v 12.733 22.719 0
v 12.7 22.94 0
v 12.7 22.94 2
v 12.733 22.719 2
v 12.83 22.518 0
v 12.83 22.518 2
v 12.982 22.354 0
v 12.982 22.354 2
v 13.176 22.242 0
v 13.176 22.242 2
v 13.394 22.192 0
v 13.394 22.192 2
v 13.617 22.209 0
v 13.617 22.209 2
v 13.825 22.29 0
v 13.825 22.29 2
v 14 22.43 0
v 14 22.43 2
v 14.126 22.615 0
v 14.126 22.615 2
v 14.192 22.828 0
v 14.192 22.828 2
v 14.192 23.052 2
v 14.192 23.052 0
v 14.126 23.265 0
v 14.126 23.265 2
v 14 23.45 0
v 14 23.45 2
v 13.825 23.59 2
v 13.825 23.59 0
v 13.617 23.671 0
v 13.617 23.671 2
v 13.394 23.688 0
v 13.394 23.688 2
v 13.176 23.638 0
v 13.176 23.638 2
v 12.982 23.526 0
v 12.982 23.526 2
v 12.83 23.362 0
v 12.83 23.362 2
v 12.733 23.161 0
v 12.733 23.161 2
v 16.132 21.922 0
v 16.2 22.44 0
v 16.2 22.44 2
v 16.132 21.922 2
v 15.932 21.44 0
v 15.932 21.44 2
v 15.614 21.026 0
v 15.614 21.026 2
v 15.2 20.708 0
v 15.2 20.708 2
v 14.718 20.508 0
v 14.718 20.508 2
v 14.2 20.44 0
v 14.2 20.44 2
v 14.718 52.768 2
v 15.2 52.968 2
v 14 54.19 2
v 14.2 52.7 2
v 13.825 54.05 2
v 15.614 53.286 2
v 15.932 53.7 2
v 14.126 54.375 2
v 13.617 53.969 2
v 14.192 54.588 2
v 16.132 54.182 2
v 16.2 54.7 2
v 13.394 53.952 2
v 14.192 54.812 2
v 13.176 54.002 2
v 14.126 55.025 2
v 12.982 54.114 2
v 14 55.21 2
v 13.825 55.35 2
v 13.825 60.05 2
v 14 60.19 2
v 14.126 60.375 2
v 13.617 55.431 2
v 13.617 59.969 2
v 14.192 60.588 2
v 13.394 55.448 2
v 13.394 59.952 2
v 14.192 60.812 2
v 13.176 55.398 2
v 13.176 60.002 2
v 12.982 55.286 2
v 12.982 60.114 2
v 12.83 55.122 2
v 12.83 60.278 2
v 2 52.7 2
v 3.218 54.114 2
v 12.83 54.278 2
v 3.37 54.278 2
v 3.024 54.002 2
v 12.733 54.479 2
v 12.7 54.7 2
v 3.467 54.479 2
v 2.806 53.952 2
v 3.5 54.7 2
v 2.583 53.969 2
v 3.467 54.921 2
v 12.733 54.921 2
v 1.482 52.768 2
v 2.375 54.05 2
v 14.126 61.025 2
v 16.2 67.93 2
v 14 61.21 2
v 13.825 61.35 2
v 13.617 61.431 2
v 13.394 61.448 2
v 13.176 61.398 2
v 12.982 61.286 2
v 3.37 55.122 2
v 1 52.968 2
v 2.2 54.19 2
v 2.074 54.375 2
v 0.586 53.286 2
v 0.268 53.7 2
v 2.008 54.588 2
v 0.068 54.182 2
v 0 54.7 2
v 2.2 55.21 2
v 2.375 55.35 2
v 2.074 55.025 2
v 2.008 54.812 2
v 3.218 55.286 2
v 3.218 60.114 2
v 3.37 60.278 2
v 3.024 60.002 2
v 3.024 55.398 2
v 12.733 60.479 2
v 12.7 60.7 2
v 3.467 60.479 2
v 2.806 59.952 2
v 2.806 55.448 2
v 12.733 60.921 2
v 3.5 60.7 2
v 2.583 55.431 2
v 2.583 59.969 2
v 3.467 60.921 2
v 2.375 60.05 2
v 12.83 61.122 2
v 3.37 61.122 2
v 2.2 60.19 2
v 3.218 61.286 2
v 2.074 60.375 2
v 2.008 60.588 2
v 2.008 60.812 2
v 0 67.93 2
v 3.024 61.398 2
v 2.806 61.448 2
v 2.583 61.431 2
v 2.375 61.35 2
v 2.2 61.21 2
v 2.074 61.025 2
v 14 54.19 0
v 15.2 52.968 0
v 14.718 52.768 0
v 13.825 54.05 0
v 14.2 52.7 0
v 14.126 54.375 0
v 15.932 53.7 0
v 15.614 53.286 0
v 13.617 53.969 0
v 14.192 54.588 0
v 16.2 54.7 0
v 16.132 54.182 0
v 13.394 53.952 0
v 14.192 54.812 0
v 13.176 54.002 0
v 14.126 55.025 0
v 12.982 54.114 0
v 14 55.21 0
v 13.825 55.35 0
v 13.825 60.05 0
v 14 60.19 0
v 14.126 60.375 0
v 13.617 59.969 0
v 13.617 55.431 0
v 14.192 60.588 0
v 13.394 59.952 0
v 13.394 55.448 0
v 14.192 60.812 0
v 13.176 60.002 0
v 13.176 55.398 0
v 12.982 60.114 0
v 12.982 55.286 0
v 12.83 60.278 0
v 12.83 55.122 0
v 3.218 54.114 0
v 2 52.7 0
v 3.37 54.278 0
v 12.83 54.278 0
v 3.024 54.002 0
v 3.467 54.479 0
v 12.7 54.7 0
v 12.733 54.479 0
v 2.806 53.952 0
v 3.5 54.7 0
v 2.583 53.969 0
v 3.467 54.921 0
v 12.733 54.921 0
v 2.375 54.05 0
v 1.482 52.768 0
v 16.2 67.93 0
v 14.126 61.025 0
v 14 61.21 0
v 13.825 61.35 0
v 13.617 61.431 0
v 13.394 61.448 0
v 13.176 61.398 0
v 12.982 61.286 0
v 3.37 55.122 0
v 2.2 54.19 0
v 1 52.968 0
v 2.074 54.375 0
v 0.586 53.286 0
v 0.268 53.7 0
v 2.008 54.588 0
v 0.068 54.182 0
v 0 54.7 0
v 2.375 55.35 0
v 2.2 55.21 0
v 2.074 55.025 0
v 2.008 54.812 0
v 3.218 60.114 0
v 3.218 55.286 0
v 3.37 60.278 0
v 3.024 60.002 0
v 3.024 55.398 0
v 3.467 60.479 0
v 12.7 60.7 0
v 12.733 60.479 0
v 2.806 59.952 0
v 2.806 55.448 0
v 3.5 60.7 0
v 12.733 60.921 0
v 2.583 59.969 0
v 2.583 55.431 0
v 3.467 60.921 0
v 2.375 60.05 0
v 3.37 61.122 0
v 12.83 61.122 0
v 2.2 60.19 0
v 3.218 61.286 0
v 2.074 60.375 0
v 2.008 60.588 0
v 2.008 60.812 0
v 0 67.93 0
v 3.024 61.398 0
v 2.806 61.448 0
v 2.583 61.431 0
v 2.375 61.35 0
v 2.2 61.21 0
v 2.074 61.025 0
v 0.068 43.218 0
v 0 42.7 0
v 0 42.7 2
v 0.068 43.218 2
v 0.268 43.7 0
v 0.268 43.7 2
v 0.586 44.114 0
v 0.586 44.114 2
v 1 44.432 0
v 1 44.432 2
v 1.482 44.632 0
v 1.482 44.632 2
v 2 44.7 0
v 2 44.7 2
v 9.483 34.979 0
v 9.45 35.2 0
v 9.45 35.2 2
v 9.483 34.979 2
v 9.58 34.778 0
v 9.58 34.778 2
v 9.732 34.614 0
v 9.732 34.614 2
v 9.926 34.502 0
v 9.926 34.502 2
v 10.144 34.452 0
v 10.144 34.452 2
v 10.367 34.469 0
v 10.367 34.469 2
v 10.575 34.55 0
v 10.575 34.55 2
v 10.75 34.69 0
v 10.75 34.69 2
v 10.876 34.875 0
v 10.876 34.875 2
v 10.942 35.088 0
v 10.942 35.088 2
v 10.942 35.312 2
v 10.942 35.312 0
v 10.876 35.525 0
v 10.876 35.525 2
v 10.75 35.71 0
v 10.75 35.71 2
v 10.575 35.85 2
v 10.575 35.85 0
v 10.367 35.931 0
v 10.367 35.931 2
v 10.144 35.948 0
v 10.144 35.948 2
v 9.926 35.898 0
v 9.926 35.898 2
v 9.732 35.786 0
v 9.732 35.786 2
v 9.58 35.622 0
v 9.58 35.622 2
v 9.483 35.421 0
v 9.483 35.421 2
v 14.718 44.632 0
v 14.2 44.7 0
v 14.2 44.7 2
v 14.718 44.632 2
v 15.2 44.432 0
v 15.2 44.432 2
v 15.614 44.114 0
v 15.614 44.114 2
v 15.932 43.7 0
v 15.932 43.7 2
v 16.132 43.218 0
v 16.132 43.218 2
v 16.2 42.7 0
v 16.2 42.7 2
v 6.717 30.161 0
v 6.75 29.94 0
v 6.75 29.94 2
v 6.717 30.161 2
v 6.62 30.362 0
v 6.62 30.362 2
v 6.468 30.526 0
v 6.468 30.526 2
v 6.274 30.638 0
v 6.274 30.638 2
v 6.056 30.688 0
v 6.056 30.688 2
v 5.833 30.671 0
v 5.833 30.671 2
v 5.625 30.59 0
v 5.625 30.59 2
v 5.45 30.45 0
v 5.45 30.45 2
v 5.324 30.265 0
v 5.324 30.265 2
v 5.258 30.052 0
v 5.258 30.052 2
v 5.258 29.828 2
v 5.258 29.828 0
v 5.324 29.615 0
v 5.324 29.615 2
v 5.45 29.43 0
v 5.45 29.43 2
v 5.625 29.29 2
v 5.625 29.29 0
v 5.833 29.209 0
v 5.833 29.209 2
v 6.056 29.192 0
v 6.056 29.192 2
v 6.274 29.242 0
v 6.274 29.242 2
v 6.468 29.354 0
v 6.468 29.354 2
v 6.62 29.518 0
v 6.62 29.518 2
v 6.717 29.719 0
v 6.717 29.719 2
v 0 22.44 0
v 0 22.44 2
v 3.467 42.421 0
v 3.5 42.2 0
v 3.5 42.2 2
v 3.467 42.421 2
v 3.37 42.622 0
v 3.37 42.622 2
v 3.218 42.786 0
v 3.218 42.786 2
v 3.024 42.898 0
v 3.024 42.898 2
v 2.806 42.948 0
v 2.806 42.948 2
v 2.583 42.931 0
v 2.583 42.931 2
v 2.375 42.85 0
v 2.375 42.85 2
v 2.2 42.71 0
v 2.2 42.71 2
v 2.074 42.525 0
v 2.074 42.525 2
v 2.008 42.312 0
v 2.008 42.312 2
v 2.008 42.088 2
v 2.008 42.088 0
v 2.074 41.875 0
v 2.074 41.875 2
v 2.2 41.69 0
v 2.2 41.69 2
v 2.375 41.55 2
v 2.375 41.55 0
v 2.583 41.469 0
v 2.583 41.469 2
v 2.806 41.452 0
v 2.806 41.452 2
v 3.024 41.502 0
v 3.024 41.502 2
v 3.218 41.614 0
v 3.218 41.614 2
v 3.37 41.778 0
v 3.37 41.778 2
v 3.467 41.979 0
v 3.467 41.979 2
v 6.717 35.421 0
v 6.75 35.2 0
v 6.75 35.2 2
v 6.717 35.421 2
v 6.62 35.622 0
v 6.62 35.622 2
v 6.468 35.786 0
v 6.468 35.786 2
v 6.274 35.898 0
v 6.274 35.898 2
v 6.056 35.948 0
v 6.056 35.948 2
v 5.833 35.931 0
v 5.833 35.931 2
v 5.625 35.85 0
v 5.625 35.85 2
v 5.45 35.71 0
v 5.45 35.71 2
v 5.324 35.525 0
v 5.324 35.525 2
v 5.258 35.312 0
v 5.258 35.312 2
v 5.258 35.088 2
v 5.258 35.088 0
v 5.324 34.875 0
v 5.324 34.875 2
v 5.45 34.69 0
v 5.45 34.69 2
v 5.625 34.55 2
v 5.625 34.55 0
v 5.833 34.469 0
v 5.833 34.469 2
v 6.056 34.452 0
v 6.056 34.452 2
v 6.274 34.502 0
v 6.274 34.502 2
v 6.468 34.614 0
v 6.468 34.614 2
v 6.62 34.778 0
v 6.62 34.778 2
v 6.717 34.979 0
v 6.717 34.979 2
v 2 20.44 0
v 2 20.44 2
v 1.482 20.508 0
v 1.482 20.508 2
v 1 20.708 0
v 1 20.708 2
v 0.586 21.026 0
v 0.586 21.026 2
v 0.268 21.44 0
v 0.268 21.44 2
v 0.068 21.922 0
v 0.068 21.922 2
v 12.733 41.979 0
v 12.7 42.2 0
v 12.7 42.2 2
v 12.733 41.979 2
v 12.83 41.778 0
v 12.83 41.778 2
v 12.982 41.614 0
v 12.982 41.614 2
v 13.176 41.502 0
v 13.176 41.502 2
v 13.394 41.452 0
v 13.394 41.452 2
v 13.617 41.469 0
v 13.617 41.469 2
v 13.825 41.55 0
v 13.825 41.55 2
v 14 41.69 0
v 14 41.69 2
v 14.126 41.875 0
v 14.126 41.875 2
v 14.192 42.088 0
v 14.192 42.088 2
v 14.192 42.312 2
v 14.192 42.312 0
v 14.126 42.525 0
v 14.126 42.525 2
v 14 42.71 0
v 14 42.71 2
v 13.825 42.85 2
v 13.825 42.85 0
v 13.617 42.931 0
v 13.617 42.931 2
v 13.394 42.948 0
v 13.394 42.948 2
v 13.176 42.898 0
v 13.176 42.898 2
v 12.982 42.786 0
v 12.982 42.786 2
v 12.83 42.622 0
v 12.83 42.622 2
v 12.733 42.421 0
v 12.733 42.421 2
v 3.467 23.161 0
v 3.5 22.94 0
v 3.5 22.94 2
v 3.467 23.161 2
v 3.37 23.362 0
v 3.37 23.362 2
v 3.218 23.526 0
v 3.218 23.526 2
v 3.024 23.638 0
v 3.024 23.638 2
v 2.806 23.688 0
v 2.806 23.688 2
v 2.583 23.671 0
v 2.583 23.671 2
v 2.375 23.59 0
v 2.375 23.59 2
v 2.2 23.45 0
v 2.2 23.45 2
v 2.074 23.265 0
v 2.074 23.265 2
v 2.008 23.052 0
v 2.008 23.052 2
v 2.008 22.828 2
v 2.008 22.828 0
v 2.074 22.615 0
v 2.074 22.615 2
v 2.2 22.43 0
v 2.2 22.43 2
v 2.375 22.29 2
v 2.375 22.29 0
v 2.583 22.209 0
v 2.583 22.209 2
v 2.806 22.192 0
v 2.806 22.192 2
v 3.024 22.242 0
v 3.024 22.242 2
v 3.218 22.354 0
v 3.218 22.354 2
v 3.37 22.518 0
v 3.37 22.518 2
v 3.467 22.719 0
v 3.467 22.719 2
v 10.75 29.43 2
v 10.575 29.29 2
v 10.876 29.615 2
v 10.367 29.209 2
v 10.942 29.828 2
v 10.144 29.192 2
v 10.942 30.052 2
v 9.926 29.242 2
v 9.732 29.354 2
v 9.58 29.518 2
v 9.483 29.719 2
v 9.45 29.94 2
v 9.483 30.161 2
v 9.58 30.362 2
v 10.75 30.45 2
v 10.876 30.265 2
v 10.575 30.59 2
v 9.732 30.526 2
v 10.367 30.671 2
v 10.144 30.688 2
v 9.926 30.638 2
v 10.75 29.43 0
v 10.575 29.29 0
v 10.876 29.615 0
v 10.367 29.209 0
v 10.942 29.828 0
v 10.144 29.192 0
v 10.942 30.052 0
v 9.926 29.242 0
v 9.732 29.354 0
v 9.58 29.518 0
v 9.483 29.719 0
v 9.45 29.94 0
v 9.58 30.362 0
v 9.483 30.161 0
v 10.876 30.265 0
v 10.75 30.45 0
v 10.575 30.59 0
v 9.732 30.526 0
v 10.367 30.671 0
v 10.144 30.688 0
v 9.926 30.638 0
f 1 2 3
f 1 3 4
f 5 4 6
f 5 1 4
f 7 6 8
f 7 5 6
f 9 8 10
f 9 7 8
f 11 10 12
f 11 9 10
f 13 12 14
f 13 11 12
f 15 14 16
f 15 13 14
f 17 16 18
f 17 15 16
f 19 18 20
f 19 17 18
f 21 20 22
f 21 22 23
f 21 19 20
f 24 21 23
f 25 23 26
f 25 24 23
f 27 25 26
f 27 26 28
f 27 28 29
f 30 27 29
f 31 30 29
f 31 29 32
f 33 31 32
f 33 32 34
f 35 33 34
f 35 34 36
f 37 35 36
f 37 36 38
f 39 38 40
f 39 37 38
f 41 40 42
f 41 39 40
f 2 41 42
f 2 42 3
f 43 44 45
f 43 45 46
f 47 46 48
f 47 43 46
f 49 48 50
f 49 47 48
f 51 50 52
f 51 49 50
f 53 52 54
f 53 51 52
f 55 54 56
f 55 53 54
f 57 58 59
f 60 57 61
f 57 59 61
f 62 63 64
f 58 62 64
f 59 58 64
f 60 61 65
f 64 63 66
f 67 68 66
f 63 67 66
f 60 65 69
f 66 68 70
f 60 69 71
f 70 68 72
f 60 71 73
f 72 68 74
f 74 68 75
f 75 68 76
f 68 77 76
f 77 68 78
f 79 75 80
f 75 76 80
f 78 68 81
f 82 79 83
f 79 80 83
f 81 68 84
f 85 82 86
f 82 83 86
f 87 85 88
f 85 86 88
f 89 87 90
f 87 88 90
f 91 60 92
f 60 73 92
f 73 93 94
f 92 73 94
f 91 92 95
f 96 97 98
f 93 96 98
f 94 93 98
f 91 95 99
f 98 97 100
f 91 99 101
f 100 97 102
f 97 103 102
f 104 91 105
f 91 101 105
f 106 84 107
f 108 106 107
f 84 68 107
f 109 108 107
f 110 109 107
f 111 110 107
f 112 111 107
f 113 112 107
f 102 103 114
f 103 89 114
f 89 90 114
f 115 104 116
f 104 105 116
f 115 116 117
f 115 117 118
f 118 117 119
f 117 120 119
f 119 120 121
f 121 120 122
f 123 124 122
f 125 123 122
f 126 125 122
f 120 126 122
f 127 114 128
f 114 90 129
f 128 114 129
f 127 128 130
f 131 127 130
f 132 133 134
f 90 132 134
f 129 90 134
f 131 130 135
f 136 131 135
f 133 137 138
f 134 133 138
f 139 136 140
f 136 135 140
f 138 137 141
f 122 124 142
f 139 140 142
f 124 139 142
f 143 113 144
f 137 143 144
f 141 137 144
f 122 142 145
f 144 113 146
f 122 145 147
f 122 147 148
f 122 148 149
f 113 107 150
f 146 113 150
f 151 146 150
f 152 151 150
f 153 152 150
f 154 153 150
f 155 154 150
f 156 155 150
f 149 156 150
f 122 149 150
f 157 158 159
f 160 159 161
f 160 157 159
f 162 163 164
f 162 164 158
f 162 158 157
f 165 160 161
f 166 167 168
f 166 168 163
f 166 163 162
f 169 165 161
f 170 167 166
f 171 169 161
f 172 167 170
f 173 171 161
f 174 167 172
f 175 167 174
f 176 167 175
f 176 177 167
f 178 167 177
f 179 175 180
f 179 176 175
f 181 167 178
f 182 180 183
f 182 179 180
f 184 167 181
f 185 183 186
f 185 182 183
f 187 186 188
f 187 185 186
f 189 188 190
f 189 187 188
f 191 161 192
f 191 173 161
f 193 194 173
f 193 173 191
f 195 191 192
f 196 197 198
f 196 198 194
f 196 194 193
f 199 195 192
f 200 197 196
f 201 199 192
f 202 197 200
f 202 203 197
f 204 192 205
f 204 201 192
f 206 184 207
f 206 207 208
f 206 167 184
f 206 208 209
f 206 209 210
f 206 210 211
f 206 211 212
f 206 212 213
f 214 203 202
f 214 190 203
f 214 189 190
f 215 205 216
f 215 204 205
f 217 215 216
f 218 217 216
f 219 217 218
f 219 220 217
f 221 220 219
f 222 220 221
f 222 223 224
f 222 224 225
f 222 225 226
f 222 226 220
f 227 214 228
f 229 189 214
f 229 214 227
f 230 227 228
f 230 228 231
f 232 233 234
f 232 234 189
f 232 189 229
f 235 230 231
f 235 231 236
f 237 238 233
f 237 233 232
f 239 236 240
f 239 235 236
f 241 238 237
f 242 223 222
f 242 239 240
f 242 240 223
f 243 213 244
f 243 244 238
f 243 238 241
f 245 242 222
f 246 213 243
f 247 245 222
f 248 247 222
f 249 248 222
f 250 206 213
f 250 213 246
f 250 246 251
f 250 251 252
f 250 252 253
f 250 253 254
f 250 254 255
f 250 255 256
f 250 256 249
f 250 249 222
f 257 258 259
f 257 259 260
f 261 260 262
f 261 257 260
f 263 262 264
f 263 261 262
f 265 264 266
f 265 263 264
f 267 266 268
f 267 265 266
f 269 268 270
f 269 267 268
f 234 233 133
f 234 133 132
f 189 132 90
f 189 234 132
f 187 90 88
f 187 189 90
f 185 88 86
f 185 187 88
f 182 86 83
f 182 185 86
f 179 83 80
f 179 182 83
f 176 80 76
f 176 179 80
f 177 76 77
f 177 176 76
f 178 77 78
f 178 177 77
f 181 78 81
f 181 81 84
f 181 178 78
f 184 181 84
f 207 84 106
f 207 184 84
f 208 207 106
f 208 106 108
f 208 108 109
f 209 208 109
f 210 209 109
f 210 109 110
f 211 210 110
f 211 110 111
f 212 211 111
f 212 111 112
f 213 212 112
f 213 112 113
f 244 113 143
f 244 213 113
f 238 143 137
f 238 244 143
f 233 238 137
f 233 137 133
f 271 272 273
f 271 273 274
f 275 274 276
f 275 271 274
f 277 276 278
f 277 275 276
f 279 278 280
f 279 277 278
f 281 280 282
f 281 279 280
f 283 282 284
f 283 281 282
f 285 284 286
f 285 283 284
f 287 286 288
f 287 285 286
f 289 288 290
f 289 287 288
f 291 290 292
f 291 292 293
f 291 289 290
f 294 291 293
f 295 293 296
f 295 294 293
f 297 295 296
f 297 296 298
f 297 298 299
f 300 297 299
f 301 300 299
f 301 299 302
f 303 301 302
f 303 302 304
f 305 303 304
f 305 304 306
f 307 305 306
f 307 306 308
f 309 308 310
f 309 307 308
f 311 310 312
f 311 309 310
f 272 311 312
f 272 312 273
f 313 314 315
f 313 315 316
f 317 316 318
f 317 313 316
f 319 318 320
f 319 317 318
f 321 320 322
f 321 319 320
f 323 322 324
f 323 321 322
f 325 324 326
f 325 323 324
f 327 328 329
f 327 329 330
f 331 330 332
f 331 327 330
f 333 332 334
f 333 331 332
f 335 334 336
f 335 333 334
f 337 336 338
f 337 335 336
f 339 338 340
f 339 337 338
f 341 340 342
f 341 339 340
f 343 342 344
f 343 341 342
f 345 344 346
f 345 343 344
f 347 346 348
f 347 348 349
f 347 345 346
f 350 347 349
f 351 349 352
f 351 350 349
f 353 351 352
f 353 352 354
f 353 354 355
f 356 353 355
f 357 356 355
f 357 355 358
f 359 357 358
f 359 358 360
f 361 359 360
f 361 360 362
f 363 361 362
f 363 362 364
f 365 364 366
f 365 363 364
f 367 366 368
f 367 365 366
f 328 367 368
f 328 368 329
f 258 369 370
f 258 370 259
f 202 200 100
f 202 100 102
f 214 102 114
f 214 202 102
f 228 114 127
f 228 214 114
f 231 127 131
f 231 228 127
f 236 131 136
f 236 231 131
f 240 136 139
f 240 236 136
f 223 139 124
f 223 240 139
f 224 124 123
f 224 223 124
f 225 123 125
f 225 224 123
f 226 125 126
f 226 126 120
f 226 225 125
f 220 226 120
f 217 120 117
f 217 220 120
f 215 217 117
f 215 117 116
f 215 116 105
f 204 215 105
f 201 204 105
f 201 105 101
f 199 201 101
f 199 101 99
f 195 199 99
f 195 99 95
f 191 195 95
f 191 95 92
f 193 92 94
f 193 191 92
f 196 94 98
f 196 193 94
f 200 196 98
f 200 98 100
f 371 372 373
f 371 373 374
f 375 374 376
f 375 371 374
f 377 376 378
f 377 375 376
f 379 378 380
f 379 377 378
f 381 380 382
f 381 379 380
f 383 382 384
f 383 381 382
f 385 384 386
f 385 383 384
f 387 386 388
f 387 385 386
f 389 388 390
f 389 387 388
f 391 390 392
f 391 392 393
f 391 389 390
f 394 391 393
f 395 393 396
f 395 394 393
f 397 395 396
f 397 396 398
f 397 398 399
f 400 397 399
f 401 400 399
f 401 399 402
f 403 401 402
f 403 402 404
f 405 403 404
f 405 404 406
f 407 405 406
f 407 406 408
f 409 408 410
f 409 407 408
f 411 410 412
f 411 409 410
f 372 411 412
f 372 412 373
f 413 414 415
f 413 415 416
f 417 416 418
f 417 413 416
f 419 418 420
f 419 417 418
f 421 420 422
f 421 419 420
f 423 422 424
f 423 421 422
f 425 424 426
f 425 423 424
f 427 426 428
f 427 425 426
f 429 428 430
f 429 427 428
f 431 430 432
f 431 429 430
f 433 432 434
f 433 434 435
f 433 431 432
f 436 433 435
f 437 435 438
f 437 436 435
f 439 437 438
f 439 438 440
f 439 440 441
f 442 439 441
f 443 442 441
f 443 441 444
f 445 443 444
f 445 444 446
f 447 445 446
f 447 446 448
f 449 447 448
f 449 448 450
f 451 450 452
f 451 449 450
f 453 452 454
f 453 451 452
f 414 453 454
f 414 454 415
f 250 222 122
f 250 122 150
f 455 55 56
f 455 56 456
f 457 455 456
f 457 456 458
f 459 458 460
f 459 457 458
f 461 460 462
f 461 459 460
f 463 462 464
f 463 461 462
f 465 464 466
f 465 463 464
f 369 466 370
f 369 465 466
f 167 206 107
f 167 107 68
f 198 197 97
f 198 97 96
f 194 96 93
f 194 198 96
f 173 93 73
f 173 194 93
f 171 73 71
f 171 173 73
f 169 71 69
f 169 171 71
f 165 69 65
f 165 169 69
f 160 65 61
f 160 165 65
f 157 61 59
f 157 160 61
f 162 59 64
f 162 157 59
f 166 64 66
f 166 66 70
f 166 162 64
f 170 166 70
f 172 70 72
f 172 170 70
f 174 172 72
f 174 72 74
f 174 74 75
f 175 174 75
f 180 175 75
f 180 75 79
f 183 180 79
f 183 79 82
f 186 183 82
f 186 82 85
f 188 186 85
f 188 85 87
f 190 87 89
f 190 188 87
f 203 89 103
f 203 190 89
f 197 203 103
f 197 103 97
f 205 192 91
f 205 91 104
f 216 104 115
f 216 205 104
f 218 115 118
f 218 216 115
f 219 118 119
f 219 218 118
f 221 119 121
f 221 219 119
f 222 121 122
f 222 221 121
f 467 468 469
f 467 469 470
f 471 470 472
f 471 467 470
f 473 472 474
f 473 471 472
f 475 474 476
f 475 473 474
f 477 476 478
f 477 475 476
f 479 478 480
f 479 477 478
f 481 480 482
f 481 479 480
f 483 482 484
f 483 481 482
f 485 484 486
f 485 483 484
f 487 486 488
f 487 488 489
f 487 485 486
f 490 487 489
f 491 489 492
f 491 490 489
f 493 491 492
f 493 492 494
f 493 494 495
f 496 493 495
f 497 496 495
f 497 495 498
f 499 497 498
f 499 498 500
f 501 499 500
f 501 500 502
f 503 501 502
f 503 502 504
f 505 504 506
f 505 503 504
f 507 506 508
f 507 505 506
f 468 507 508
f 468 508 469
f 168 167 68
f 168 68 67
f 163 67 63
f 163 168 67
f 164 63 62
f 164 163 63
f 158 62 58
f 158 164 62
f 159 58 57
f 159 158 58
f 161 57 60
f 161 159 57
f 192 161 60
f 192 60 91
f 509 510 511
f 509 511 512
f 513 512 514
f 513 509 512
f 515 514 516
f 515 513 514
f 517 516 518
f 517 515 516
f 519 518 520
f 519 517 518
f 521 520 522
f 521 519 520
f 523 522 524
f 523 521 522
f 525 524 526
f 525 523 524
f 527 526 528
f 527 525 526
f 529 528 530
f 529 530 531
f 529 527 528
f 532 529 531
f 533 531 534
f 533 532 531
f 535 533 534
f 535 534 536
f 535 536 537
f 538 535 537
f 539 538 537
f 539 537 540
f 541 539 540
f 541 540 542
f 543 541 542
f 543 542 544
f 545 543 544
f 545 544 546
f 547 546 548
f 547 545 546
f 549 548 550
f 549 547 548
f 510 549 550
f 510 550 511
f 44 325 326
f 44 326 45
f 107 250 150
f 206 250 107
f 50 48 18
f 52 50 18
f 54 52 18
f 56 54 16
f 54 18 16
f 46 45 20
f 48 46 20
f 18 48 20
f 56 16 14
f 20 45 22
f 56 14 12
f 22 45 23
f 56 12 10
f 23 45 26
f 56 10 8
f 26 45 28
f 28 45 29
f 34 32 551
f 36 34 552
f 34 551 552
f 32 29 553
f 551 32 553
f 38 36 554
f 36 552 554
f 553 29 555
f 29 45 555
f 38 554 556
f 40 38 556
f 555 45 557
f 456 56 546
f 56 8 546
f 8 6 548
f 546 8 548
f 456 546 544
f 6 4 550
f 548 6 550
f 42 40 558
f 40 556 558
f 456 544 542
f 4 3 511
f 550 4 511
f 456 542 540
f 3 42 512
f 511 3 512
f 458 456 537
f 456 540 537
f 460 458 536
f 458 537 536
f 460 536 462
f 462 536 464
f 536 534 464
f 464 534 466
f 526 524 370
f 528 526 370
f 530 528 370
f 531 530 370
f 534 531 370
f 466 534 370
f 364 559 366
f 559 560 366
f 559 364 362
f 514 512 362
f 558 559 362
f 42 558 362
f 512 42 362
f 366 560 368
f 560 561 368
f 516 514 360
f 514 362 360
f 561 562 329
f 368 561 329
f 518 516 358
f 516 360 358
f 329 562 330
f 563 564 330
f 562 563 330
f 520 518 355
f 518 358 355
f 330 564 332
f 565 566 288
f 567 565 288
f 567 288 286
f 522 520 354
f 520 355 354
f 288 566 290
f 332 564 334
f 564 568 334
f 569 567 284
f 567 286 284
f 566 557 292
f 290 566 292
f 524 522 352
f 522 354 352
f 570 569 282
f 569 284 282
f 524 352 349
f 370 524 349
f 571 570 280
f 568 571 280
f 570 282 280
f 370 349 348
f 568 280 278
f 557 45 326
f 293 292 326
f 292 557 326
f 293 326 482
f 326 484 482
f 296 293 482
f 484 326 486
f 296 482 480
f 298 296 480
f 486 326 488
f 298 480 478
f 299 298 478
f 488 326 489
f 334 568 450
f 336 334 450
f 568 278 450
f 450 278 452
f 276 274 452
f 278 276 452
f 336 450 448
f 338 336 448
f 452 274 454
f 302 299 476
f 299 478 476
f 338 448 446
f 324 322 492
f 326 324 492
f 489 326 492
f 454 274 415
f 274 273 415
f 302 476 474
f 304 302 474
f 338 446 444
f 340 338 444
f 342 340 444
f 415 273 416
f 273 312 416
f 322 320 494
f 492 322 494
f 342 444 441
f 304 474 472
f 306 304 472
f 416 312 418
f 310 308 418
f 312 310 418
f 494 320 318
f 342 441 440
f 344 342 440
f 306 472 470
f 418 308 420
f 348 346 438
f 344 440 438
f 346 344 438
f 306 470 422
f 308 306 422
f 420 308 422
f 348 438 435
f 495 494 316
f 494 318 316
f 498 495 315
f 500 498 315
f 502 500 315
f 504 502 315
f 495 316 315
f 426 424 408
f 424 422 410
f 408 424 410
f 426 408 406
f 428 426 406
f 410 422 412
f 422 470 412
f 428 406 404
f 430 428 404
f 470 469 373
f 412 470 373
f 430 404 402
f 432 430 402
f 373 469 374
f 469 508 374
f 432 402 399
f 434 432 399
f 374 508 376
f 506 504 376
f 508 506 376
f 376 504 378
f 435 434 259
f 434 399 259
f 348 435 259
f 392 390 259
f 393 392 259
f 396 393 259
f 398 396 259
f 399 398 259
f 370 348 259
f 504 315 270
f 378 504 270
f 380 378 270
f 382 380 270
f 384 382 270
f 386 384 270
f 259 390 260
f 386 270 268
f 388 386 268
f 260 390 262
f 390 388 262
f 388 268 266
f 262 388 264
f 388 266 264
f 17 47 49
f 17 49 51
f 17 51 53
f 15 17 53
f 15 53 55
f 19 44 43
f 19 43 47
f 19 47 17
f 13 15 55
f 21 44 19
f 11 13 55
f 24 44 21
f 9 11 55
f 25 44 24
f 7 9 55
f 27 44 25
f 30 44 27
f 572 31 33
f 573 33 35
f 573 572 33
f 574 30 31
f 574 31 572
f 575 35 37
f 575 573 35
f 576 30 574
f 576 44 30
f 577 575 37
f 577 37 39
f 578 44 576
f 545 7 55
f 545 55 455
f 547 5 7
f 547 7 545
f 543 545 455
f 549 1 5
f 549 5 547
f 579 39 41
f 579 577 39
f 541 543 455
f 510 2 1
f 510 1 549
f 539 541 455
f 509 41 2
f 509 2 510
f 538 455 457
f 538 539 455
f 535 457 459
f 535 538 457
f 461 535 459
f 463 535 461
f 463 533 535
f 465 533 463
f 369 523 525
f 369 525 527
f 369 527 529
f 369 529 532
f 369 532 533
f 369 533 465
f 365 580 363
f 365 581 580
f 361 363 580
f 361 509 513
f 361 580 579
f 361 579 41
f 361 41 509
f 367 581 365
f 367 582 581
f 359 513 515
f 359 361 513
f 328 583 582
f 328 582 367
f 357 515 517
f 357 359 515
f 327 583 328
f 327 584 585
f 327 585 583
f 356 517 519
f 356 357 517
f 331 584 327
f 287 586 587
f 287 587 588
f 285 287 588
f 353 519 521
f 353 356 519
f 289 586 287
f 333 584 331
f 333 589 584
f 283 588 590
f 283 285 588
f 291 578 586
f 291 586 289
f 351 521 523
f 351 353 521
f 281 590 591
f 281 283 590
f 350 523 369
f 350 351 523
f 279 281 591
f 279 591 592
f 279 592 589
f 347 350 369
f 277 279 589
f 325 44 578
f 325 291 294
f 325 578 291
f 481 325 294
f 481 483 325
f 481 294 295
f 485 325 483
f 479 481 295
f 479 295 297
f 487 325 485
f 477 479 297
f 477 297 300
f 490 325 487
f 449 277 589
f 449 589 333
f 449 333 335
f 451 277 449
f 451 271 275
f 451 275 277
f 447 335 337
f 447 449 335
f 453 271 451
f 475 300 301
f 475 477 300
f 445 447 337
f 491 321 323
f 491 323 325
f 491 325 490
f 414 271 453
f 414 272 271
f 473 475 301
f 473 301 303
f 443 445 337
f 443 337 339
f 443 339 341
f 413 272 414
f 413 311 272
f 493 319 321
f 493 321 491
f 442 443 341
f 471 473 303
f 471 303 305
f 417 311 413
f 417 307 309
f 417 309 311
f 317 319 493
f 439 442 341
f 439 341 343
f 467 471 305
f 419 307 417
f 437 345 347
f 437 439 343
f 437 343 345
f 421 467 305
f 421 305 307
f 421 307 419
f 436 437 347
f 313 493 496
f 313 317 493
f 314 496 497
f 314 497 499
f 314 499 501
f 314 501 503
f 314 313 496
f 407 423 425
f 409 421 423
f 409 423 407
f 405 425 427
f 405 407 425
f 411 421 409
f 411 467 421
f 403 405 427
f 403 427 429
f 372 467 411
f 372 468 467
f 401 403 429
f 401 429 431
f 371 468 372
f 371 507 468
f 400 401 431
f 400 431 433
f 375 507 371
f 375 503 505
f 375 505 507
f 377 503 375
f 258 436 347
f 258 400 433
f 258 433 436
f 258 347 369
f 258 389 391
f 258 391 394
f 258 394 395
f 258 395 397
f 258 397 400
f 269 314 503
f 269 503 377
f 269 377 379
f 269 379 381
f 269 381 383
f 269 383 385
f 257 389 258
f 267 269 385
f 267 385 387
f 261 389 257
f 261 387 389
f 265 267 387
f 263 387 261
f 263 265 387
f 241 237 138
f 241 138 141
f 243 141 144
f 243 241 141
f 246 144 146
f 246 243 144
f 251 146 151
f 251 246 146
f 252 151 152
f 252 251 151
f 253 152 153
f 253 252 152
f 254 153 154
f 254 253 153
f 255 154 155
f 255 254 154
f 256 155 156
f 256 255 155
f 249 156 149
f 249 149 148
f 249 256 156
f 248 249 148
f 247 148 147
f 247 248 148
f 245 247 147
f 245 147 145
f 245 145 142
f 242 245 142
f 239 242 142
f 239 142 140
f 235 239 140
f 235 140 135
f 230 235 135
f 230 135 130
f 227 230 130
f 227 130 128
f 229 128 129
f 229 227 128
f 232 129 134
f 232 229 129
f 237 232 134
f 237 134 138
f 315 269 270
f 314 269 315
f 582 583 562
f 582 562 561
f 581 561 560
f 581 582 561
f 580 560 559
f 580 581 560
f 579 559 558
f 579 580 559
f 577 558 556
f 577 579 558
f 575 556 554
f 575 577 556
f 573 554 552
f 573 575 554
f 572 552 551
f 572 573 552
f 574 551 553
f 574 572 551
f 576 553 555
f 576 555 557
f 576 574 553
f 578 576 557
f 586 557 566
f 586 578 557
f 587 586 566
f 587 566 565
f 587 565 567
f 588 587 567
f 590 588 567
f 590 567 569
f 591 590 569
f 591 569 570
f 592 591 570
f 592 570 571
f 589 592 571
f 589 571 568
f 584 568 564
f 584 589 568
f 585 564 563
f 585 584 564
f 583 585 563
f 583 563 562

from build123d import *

# Parameters (mm, degrees)
SKETCH1_R           = 0.75
SKETCH1_W           = 4.2
SKETCH1_H           = 8
BOSS_EXTRUDE1_DEPTH = 2
SKETCH2_W           = 8.2
SKETCH2_H           = 8
CUT_EXTRUDE1_DEPTH  = 2


with BuildPart() as part:
    # Sketch1 → Boss-Extrude1 (new body)
    with BuildSketch(Plane.XY):
        with BuildLine():
            Line((4, 44.7), (4, 52.7))
            Line((4, 52.7), (2, 52.7))
            ThreePointArc((2, 52.7), (0.585786438, 53.285786438), (0, 54.7))
            Line((0, 54.7), (0, 67.93))
            Line((0, 67.93), (16.2, 67.93))
            Line((16.2, 67.93), (16.2, 54.7))
            ThreePointArc((16.2, 54.7), (15.614213562, 53.285786438), (14.2, 52.7))
            Line((14.2, 52.7), (12.2, 52.7))
            Line((12.2, 52.7), (12.2, 44.7))
            Line((12.2, 44.7), (14.2, 44.7))
            ThreePointArc((14.2, 44.7), (15.614213562, 44.114213562), (16.2, 42.7))
            Line((16.2, 42.7), (16.2, 22.44))
            ThreePointArc((16.2, 22.44), (15.614213562, 21.025786438), (14.2, 20.44))
            Line((14.2, 20.44), (12.2, 20.44))
            Line((12.2, 20.44), (12.2, 12.44))
            Line((12.2, 12.44), (10.2, 12.44))
            Line((10.2, 12.44), (10.2, 20.44))
            Line((10.2, 20.44), (6, 20.44))
            Line((6, 20.44), (6, 12.44))
            Line((6, 12.44), (4, 12.44))
            Line((4, 12.44), (4, 20.44))
            Line((4, 20.44), (2, 20.44))
            ThreePointArc((2, 20.44), (0.585786438, 21.025786438), (0, 22.44))
            Line((0, 22.44), (0, 42.7))
            ThreePointArc((0, 42.7), (0.585786438, 44.114213562), (2, 44.7))
            Line((2, 44.7), (4, 44.7))
        make_face()
        with Locations((2.75, 60.7)):
            Circle(SKETCH1_R, mode=Mode.SUBTRACT)
        with Locations(Location((13.45, 54.7, 0), (0, 0, 180))):
            Circle(SKETCH1_R, mode=Mode.SUBTRACT)
        with Locations(Location((13.45, 42.2, 0), (0, 0, 180))):
            Circle(SKETCH1_R, mode=Mode.SUBTRACT)
        with Locations(Location((13.45, 22.94, 0), (0, 0, 180))):
            Circle(SKETCH1_R, mode=Mode.SUBTRACT)
        with Locations(Location((10.2, 29.94, 0), (0, 0, 180))):
            Circle(SKETCH1_R, mode=Mode.SUBTRACT)
        with Locations((6, 35.2)):
            Circle(SKETCH1_R, mode=Mode.SUBTRACT)
        with Locations(Location((13.45, 60.7, 0), (0, 0, 180))):
            Circle(SKETCH1_R, mode=Mode.SUBTRACT)
        with Locations(Location((10.2, 35.2, 0), (0, 0, 180))):
            Circle(SKETCH1_R, mode=Mode.SUBTRACT)
        with Locations((6, 29.94)):
            Circle(SKETCH1_R, mode=Mode.SUBTRACT)
        with Locations((2.75, 22.94)):
            Circle(SKETCH1_R, mode=Mode.SUBTRACT)
        with Locations((2.75, 42.2)):
            Circle(SKETCH1_R, mode=Mode.SUBTRACT)
        with Locations((2.75, 54.7)):
            Circle(SKETCH1_R, mode=Mode.SUBTRACT)
        with Locations((8.1, 48.7)):
            Rectangle(SKETCH1_W, SKETCH1_H, mode=Mode.SUBTRACT)
    extrude(amount=BOSS_EXTRUDE1_DEPTH)

    # Sketch2 → Cut-Extrude1 (cut)
    with BuildSketch(Plane.XY.offset(2)):
        with Locations((8.1, 16.44)):
            Rectangle(SKETCH2_W, SKETCH2_H)
        with Locations((8.1, 48.7)):
            Rectangle(SKETCH2_W, SKETCH2_H)
    extrude(amount=-CUT_EXTRUDE1_DEPTH, mode=Mode.SUBTRACT)


with BuildPart() as cut_extrude1_piece_1:
    # of the separate pieces the step leaves, piece 1, a body of its own (cut_extrude1_pieces)
    add(part.part.solids().sort_by_distance((0, 42.7, 0))[0])


with BuildPart() as cut_extrude1_piece_2:
    # of the separate pieces the step leaves, piece 2, a body of its own (cut_extrude1_pieces)
    add(part.part.solids().sort_by_distance((2, 52.7, 0))[0])


solid = Compound([cut_extrude1_piece_1.part, cut_extrude1_piece_2.part])
